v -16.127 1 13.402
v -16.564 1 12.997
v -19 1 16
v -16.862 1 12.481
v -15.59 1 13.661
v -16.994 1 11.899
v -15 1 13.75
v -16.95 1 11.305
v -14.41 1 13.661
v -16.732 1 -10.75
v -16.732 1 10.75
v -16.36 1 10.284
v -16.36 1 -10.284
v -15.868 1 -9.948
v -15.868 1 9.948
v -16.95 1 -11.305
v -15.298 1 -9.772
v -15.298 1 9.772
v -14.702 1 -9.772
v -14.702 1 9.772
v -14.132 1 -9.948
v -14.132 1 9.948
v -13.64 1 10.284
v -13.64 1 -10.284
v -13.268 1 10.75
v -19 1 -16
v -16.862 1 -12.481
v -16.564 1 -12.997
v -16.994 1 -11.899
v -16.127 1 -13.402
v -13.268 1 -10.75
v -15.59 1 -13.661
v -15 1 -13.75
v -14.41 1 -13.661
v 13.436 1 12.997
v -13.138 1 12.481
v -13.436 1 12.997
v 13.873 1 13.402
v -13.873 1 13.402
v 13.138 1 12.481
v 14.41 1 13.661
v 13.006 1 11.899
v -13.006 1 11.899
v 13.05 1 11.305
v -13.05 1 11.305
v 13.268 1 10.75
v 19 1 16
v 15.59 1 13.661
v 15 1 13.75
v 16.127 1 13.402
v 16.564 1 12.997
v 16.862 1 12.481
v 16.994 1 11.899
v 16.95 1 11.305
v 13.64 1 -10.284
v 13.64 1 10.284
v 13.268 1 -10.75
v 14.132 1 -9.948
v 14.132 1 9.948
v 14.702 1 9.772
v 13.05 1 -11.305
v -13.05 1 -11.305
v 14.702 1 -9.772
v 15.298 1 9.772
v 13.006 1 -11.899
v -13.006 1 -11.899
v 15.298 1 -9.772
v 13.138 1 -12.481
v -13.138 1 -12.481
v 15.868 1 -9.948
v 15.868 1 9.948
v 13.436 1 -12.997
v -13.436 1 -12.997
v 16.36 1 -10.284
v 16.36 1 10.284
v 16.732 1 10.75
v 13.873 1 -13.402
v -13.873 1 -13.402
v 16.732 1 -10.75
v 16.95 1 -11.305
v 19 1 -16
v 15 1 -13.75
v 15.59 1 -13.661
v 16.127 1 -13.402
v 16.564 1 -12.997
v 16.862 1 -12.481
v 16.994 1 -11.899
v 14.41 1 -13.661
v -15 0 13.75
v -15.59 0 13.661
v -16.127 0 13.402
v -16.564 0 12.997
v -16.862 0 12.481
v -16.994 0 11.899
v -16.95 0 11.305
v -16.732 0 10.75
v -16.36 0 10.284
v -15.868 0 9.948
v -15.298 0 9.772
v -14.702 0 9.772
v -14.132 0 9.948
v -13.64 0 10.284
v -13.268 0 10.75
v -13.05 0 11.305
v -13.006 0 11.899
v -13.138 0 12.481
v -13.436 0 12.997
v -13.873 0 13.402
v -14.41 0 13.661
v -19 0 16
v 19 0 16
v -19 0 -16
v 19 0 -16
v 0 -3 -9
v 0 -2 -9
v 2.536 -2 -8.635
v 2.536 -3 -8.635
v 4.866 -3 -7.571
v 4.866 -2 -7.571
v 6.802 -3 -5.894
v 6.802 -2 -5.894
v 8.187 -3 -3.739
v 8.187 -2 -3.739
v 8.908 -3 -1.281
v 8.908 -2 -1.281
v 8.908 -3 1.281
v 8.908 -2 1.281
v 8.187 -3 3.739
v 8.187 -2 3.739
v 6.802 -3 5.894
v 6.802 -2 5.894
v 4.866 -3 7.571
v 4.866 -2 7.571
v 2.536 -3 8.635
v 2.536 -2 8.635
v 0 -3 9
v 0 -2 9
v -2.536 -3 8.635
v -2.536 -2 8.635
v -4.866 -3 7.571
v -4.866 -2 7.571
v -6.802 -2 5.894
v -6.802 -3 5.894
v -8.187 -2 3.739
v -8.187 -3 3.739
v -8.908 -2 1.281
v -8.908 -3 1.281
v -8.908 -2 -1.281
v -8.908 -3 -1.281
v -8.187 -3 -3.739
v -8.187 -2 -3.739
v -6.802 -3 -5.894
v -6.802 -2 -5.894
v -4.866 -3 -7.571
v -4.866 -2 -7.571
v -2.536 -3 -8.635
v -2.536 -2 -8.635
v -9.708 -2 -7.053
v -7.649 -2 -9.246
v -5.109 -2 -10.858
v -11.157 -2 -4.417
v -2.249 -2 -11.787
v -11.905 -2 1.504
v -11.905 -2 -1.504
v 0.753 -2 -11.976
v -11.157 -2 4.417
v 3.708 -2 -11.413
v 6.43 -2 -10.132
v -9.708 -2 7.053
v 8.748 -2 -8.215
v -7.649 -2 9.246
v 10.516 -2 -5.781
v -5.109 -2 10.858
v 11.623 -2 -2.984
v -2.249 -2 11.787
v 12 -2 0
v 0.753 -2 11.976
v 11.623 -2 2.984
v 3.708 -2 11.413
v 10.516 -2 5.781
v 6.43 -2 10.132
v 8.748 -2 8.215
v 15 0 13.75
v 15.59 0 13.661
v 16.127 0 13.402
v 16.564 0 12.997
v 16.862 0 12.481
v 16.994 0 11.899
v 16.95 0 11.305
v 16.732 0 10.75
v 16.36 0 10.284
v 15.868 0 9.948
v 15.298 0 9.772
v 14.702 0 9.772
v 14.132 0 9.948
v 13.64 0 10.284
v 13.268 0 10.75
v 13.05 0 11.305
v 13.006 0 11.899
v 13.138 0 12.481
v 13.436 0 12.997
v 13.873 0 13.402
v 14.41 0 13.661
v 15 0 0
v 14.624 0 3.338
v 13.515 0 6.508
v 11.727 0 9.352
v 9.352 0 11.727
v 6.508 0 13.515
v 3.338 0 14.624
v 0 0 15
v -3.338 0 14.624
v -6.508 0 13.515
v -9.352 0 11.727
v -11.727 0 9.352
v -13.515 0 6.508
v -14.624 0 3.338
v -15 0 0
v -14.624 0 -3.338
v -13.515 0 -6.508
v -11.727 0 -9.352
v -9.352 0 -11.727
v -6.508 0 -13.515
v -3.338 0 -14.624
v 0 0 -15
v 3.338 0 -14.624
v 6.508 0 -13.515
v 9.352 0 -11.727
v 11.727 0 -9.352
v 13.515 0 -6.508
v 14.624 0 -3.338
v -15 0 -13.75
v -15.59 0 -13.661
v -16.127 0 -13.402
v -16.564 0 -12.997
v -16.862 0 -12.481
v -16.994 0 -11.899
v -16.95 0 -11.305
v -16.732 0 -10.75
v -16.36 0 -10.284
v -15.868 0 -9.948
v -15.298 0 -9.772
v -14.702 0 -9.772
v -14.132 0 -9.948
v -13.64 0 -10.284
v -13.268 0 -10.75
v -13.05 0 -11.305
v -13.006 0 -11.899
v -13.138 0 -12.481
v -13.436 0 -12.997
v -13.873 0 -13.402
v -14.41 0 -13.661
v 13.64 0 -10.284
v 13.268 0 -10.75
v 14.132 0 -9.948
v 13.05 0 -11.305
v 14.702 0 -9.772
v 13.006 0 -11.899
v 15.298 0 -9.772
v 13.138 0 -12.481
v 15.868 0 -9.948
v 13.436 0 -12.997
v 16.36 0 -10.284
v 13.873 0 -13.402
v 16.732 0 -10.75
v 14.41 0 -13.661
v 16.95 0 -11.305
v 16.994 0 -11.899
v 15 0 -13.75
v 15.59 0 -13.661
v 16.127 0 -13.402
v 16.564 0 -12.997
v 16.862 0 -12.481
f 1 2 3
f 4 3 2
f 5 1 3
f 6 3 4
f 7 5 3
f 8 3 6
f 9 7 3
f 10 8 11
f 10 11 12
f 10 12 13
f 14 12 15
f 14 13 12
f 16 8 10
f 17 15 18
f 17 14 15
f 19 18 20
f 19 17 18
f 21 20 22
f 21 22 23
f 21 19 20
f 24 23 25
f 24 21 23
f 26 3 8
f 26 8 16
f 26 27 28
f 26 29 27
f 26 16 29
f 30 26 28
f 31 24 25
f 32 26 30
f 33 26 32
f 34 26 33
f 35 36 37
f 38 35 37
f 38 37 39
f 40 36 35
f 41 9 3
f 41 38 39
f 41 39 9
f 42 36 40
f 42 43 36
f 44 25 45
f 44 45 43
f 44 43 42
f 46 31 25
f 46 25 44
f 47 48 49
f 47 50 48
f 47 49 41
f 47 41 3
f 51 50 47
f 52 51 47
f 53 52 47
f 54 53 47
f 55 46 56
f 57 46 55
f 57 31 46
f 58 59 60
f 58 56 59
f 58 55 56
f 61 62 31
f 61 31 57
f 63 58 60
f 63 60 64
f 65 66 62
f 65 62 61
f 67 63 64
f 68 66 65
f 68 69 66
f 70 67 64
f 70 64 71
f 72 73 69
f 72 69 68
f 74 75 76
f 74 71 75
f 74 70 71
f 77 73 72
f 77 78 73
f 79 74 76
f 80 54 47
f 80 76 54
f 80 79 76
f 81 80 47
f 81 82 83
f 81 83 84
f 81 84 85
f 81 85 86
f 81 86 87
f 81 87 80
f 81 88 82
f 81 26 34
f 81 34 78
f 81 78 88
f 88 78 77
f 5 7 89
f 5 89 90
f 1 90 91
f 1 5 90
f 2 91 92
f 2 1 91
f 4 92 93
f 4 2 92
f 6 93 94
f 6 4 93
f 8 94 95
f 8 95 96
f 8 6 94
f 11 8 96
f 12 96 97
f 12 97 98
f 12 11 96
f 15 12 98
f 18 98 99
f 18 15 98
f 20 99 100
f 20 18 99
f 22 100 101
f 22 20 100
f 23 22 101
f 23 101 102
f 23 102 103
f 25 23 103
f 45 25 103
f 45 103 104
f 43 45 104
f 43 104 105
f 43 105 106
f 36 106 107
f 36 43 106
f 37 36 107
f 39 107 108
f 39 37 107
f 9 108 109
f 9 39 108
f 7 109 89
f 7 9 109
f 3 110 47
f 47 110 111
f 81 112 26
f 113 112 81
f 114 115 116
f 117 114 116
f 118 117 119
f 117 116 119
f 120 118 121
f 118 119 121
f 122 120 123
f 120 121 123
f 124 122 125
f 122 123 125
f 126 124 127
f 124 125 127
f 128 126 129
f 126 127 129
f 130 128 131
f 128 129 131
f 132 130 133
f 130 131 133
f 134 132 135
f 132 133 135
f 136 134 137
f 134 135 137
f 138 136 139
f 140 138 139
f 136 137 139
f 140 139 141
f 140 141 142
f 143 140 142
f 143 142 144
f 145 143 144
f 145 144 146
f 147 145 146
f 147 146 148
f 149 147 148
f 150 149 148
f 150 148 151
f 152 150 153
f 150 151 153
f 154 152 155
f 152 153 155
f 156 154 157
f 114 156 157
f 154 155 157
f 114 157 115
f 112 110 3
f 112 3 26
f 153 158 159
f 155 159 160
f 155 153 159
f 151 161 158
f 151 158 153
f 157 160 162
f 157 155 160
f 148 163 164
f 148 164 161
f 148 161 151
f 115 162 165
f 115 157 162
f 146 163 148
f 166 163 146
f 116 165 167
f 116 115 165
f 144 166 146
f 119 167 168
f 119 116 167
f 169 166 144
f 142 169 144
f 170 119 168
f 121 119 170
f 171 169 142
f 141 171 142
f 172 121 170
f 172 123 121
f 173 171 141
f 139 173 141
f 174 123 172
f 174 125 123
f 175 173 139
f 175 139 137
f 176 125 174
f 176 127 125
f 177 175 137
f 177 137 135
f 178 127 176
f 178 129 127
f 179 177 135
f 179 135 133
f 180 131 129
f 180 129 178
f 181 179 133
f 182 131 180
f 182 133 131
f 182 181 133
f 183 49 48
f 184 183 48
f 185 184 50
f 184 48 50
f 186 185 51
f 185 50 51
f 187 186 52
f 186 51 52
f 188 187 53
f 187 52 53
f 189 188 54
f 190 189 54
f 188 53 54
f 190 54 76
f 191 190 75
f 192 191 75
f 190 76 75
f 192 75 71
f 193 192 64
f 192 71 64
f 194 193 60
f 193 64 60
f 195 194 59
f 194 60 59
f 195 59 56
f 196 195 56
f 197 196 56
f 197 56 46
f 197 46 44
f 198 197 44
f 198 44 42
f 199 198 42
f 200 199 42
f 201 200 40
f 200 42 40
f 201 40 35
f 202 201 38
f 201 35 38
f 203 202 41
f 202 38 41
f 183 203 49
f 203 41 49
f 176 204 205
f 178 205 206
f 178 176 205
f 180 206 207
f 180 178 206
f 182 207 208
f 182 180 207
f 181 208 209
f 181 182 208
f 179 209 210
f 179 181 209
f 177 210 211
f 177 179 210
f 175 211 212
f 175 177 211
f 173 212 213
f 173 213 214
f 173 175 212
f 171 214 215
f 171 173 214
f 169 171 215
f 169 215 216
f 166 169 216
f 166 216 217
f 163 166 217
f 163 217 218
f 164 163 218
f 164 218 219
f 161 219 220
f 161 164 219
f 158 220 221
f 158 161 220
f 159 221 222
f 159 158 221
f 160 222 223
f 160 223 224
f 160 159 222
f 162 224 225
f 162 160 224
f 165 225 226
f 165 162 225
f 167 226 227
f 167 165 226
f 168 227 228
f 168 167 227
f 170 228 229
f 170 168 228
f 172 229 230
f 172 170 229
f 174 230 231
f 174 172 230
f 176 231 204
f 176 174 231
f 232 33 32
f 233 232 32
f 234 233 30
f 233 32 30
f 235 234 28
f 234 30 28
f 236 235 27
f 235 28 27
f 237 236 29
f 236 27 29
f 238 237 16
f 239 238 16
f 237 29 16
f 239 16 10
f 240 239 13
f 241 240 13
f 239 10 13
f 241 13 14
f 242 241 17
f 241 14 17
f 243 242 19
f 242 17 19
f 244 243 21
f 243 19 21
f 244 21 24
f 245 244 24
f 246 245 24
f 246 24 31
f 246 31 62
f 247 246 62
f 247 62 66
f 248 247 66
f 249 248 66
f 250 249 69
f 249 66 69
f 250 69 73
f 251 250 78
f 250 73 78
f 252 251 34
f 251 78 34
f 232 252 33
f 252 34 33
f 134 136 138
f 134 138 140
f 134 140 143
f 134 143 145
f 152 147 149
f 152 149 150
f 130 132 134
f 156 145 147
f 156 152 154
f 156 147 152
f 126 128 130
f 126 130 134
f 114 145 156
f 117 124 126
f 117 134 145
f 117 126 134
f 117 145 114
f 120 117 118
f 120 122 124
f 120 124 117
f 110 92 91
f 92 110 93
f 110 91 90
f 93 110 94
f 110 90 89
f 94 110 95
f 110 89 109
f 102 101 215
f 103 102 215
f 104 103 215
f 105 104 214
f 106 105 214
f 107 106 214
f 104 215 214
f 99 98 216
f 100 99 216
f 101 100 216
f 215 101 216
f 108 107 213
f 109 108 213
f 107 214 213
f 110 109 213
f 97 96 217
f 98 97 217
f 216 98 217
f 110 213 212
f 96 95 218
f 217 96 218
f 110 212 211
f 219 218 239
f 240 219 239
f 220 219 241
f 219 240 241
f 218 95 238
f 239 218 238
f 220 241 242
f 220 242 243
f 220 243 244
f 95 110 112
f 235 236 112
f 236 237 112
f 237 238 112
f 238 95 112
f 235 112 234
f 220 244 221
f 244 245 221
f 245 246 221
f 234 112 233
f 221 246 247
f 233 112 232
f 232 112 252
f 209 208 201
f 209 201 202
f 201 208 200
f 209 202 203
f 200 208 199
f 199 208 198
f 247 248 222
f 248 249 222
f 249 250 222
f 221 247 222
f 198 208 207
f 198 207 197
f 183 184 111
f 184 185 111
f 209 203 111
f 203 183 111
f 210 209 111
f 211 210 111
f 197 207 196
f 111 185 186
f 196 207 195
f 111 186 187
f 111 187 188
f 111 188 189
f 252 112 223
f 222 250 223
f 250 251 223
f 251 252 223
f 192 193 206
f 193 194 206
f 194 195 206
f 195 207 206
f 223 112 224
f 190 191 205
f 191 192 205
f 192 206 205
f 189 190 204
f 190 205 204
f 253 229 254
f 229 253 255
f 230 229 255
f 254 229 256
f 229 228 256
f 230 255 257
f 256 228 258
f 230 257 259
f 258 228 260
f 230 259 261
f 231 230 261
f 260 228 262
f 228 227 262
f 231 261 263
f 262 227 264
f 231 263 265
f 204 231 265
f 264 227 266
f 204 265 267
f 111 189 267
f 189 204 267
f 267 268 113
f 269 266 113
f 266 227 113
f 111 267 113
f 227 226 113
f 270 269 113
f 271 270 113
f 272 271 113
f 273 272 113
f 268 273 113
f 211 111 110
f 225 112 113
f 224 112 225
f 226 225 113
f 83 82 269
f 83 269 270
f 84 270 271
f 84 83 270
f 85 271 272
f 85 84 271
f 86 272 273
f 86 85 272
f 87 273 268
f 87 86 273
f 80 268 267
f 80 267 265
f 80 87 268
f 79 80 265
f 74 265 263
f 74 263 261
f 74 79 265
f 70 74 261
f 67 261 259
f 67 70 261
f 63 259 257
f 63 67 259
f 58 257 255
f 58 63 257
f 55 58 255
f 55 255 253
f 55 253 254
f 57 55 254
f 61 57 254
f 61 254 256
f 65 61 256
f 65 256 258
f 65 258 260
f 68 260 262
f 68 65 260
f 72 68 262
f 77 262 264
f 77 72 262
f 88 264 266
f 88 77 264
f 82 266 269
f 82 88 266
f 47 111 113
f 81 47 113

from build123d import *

# Parameters (mm, degrees)
SKETCH1_W               = 38
SKETCH1_H               = 32
BOSS_EXTRUDE1_DEPTH     = 1
SKETCH2_R               = 2
CUT_EXTRUDE1_DEPTH      = 1
MIRROR2_COPY_1_SKETCH_R = 2
MIRROR2_COPY_1_DEPTH    = 1
SKETCH3_R               = 15
SKETCH4_R               = 12
SKETCH5_R               = 9
BOSS_EXTRUDE2_DEPTH     = 1


with BuildPart() as part:
    # Sketch1 → Boss-Extrude1 (new body)
    with BuildSketch(Plane(origin=(0, 0, 0), x_dir=(1, 0, 0), z_dir=(0, 1, 0))):
        Rectangle(SKETCH1_W, SKETCH1_H)
    extrude(amount=BOSS_EXTRUDE1_DEPTH)

    # Sketch2 → Cut-Extrude1 (cut)
    with BuildSketch(Plane(origin=(0, 1, 0), x_dir=(1, 0, 0), z_dir=(0, 1, 0))):
        with Locations(Location((15, -11.75, 0), (0, 0, 270))):
            Circle(SKETCH2_R)
    cut_extrude1 = extrude(amount=-CUT_EXTRUDE1_DEPTH, mode=Mode.SUBTRACT)

    # Mirror1: Cut-Extrude1 across plane
    add(cut_extrude1.mirror(Plane(origin=(0, 0, 0), x_dir=(0, 0, 1), z_dir=(1, 0, 0))), mode=Mode.SUBTRACT)

    # Mirror2: Cut-Extrude1 across plane
    add(cut_extrude1.mirror(Plane.XY), mode=Mode.SUBTRACT)

    # Mirror2 copy 1 sketch → Mirror2 copy 1 (cut)
    with BuildSketch(Plane(origin=(0, 1, 0), x_dir=(-1, 0, 0), z_dir=(0, 1, 0))):
        with Locations(Location((15, -11.75, 0), (0, 0, 270))):
            Circle(MIRROR2_COPY_1_SKETCH_R)
    extrude(amount=-MIRROR2_COPY_1_DEPTH, mode=Mode.SUBTRACT)

    # Sketch3 → Loft1 section 0
    with BuildSketch(Plane.XZ):
        Circle(SKETCH3_R)
    # Sketch4 → Loft1 section 1
    with BuildSketch(Plane.XZ.offset(2)):
        Circle(SKETCH4_R)
    loft()

    # Sketch5 → Boss-Extrude2 (add)
    with BuildSketch(Plane.XZ.offset(2)):
        with Locations(Location((0, 0, 0), (0, 0, 270))):
            Circle(SKETCH5_R)
    extrude(amount=BOSS_EXTRUDE2_DEPTH)


solid = part.part
